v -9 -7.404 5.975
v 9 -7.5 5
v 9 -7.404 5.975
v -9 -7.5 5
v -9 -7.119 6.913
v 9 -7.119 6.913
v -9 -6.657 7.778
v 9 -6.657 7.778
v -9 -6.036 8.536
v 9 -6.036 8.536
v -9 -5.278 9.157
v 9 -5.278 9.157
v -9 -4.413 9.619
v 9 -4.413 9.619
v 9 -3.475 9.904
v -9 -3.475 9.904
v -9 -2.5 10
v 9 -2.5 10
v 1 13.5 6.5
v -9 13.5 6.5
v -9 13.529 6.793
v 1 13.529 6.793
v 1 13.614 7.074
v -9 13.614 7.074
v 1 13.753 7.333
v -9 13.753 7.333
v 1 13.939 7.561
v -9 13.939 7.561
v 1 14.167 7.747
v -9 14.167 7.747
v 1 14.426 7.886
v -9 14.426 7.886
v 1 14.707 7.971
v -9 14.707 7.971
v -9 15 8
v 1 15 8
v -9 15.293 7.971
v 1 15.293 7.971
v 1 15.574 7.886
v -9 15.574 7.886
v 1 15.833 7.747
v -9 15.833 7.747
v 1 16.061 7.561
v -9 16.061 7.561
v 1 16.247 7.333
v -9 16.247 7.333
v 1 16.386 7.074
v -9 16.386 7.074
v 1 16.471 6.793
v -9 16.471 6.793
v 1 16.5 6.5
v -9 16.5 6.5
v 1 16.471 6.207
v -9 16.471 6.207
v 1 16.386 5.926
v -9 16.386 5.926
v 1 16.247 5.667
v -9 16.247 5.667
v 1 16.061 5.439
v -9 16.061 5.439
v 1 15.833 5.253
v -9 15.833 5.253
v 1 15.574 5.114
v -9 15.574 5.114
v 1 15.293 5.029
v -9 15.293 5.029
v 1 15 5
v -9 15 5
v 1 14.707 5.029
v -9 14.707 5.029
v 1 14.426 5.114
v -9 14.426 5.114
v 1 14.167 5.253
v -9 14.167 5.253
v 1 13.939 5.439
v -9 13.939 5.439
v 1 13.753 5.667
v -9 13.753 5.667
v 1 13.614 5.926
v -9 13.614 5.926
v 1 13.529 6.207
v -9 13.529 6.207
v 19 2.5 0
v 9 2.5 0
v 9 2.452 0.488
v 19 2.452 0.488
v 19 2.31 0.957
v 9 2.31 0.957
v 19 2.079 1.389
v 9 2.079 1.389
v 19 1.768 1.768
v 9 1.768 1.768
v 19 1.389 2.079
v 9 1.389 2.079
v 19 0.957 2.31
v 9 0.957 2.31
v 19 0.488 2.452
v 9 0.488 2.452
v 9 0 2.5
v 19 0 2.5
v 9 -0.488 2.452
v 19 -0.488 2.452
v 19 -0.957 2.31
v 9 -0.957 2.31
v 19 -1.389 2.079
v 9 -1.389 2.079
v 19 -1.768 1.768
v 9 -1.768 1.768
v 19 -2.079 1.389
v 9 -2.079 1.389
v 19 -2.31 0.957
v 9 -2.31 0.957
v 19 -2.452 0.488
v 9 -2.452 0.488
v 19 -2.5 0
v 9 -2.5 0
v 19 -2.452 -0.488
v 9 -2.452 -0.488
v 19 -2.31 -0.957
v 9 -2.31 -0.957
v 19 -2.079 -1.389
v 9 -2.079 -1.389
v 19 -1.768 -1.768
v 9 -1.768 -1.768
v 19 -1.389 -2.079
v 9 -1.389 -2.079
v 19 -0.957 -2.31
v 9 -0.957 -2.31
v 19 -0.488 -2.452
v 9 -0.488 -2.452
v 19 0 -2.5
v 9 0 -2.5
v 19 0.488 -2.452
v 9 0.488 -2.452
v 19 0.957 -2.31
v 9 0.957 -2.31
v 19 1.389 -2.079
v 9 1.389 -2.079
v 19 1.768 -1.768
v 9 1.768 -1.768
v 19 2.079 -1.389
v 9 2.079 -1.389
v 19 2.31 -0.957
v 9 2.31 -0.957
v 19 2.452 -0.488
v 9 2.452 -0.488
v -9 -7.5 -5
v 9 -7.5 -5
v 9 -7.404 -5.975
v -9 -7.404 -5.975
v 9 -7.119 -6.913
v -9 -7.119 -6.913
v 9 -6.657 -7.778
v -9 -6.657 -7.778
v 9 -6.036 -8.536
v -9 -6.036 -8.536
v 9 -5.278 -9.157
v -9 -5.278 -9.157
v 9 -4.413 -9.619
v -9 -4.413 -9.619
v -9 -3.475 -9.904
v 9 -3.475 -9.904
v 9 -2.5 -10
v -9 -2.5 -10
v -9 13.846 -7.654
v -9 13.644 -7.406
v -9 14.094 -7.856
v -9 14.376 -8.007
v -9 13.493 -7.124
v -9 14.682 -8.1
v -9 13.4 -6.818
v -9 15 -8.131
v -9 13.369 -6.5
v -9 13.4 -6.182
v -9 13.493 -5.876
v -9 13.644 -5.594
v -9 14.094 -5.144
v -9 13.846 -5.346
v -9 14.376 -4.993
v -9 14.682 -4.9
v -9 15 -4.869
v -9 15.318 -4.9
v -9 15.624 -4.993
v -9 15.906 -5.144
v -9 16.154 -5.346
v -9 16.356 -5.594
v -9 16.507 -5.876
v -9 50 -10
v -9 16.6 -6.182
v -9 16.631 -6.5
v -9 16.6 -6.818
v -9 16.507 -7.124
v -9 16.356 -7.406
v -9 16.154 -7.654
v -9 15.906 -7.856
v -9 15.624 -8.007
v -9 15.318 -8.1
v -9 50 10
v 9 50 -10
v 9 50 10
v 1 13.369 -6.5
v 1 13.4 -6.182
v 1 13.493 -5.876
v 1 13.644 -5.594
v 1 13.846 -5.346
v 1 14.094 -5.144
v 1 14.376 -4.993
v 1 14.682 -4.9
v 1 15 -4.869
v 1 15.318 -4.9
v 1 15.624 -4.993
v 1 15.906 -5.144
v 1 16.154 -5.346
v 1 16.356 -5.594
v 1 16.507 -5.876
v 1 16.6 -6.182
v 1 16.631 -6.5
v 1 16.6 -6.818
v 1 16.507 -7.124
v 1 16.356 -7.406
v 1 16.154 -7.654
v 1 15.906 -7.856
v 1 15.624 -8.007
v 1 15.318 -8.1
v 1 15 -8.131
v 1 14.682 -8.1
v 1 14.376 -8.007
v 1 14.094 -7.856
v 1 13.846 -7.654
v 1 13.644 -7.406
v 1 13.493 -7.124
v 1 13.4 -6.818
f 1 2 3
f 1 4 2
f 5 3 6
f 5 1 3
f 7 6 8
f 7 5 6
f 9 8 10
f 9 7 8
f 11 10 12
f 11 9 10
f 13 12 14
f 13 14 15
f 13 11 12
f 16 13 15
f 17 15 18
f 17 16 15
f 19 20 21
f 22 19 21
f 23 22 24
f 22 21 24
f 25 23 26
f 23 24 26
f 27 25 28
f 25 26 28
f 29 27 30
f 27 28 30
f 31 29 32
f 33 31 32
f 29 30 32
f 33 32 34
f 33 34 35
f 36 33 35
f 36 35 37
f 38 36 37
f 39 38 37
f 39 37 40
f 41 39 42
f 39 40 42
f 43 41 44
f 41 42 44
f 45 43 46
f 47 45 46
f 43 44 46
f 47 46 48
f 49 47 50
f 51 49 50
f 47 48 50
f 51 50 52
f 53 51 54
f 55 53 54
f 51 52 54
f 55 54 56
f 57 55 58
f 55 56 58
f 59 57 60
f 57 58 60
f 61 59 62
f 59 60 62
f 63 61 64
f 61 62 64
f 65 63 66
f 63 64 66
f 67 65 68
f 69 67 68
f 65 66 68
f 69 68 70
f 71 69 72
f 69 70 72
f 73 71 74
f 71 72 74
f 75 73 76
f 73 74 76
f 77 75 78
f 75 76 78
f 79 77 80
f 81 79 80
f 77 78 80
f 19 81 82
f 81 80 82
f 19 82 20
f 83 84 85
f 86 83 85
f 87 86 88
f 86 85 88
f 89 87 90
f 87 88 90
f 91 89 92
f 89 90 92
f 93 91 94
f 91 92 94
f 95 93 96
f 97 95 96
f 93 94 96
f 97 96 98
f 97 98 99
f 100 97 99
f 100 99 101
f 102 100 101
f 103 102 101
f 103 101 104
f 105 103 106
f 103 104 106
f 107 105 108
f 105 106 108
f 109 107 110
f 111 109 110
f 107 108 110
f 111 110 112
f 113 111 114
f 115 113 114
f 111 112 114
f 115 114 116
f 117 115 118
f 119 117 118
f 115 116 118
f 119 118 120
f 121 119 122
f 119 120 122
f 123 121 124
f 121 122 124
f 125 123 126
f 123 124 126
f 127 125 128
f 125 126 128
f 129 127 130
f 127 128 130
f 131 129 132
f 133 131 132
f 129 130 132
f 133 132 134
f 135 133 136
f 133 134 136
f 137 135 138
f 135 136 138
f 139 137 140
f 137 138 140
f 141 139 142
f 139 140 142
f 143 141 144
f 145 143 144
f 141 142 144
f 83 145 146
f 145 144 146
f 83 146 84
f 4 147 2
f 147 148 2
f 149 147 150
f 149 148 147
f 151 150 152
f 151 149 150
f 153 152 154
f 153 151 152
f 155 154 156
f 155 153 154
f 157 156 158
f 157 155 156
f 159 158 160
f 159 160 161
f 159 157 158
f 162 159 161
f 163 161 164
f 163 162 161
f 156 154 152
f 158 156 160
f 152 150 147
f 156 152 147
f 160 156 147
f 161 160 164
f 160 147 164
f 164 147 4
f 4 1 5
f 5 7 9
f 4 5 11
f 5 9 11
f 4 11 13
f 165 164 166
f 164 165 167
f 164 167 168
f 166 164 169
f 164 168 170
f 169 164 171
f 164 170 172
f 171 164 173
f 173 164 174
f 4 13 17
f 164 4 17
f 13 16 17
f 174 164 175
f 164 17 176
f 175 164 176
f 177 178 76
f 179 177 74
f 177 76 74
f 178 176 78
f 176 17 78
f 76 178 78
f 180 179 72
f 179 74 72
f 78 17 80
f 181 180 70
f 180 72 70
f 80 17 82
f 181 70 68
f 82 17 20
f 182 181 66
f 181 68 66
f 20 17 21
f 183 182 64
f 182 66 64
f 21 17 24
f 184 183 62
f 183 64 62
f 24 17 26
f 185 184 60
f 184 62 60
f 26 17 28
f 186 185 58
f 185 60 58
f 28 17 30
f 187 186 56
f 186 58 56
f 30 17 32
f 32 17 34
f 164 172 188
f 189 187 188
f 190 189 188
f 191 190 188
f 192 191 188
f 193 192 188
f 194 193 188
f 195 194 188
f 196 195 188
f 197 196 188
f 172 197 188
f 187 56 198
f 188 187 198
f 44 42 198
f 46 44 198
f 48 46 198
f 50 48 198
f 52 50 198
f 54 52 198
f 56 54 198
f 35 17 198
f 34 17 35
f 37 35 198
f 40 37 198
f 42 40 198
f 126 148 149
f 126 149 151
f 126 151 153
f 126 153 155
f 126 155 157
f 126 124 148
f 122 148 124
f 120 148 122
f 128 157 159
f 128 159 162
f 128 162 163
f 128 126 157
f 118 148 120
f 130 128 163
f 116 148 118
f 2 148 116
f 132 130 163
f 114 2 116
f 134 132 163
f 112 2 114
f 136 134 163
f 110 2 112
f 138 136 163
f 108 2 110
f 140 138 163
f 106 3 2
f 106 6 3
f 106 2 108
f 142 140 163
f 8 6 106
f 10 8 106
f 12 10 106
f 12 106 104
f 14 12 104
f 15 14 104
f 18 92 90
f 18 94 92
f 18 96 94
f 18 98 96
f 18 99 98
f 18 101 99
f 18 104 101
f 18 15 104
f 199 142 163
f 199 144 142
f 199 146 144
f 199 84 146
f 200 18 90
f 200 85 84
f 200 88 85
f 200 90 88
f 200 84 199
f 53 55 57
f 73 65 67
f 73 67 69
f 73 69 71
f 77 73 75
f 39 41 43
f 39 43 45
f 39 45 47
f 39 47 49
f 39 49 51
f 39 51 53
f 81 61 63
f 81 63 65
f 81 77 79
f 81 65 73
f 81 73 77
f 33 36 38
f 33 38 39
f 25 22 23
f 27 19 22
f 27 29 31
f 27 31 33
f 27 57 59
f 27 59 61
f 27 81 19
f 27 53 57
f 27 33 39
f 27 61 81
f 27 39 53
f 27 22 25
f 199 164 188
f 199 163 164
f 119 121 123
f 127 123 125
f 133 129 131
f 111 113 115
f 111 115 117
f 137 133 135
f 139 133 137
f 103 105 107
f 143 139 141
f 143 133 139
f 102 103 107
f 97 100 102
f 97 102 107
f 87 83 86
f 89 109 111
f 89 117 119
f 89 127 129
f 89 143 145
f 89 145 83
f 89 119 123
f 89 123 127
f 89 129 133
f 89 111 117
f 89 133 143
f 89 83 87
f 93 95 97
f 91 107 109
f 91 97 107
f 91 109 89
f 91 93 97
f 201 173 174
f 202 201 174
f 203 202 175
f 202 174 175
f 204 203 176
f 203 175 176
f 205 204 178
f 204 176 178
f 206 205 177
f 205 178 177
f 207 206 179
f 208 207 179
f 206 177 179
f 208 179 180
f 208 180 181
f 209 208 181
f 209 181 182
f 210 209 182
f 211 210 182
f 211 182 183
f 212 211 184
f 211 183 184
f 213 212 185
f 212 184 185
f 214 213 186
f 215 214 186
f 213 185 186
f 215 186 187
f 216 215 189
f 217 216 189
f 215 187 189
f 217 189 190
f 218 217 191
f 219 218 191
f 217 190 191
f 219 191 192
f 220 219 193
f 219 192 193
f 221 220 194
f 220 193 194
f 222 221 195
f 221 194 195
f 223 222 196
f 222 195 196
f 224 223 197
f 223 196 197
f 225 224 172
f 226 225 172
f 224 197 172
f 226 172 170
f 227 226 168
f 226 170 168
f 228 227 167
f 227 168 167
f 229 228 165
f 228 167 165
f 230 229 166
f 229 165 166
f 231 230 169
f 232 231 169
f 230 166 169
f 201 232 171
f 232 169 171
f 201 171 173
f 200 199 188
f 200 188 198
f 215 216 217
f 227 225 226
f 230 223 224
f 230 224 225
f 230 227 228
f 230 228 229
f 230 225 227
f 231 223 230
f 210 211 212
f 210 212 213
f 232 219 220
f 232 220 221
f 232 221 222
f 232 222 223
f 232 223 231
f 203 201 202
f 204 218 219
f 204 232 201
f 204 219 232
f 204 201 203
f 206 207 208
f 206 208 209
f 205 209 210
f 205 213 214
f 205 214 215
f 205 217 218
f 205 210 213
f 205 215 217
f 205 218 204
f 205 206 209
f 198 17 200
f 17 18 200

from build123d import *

# Parameters (mm, degrees)
F0_W     = 57.5
F0_H     = 20
F0_R     = 2.5
F1_DEPTH = 9
F2_R     = 5
F3_R     = 2.5
F4_DEPTH = 10
F5_R     = 1.5
F5_R_2   = 1.631437
F6_DEPTH = 10


with BuildPart() as f1:
    # F0 (on Right) → F1 (new body, symmetric)
    with BuildSketch(Plane.YZ):
        with Locations((21.25, 0)):
            Rectangle(F0_W, F0_H)
        Circle(F0_R, mode=Mode.SUBTRACT)
        Circle(F0_R)
    extrude(amount=F1_DEPTH, both=True)

    # F2
    f2_edges = [f1.edges().sort_by_distance(p)[0] for p in [
        (0, -7.5, 10),
        (0, -7.5, -10),
    ]]
    fillet(f2_edges, radius=F2_R)

    # F3 (on face) → F4 (join)
    with BuildSketch(Plane.YZ.offset(9)):
        Circle(F3_R)
    extrude(amount=F4_DEPTH)

    # F5 (on face) → F6 (cut)
    with BuildSketch(Plane(origin=(-9, 0, 0), x_dir=(0, -1, 0), z_dir=(-1, 0, 0))):
        with Locations((-15, 6.5)):
            Circle(F5_R)
        with Locations((-15, -6.5)):
            Circle(F5_R_2)
    extrude(amount=-F6_DEPTH, mode=Mode.SUBTRACT)


solid = f1.part
